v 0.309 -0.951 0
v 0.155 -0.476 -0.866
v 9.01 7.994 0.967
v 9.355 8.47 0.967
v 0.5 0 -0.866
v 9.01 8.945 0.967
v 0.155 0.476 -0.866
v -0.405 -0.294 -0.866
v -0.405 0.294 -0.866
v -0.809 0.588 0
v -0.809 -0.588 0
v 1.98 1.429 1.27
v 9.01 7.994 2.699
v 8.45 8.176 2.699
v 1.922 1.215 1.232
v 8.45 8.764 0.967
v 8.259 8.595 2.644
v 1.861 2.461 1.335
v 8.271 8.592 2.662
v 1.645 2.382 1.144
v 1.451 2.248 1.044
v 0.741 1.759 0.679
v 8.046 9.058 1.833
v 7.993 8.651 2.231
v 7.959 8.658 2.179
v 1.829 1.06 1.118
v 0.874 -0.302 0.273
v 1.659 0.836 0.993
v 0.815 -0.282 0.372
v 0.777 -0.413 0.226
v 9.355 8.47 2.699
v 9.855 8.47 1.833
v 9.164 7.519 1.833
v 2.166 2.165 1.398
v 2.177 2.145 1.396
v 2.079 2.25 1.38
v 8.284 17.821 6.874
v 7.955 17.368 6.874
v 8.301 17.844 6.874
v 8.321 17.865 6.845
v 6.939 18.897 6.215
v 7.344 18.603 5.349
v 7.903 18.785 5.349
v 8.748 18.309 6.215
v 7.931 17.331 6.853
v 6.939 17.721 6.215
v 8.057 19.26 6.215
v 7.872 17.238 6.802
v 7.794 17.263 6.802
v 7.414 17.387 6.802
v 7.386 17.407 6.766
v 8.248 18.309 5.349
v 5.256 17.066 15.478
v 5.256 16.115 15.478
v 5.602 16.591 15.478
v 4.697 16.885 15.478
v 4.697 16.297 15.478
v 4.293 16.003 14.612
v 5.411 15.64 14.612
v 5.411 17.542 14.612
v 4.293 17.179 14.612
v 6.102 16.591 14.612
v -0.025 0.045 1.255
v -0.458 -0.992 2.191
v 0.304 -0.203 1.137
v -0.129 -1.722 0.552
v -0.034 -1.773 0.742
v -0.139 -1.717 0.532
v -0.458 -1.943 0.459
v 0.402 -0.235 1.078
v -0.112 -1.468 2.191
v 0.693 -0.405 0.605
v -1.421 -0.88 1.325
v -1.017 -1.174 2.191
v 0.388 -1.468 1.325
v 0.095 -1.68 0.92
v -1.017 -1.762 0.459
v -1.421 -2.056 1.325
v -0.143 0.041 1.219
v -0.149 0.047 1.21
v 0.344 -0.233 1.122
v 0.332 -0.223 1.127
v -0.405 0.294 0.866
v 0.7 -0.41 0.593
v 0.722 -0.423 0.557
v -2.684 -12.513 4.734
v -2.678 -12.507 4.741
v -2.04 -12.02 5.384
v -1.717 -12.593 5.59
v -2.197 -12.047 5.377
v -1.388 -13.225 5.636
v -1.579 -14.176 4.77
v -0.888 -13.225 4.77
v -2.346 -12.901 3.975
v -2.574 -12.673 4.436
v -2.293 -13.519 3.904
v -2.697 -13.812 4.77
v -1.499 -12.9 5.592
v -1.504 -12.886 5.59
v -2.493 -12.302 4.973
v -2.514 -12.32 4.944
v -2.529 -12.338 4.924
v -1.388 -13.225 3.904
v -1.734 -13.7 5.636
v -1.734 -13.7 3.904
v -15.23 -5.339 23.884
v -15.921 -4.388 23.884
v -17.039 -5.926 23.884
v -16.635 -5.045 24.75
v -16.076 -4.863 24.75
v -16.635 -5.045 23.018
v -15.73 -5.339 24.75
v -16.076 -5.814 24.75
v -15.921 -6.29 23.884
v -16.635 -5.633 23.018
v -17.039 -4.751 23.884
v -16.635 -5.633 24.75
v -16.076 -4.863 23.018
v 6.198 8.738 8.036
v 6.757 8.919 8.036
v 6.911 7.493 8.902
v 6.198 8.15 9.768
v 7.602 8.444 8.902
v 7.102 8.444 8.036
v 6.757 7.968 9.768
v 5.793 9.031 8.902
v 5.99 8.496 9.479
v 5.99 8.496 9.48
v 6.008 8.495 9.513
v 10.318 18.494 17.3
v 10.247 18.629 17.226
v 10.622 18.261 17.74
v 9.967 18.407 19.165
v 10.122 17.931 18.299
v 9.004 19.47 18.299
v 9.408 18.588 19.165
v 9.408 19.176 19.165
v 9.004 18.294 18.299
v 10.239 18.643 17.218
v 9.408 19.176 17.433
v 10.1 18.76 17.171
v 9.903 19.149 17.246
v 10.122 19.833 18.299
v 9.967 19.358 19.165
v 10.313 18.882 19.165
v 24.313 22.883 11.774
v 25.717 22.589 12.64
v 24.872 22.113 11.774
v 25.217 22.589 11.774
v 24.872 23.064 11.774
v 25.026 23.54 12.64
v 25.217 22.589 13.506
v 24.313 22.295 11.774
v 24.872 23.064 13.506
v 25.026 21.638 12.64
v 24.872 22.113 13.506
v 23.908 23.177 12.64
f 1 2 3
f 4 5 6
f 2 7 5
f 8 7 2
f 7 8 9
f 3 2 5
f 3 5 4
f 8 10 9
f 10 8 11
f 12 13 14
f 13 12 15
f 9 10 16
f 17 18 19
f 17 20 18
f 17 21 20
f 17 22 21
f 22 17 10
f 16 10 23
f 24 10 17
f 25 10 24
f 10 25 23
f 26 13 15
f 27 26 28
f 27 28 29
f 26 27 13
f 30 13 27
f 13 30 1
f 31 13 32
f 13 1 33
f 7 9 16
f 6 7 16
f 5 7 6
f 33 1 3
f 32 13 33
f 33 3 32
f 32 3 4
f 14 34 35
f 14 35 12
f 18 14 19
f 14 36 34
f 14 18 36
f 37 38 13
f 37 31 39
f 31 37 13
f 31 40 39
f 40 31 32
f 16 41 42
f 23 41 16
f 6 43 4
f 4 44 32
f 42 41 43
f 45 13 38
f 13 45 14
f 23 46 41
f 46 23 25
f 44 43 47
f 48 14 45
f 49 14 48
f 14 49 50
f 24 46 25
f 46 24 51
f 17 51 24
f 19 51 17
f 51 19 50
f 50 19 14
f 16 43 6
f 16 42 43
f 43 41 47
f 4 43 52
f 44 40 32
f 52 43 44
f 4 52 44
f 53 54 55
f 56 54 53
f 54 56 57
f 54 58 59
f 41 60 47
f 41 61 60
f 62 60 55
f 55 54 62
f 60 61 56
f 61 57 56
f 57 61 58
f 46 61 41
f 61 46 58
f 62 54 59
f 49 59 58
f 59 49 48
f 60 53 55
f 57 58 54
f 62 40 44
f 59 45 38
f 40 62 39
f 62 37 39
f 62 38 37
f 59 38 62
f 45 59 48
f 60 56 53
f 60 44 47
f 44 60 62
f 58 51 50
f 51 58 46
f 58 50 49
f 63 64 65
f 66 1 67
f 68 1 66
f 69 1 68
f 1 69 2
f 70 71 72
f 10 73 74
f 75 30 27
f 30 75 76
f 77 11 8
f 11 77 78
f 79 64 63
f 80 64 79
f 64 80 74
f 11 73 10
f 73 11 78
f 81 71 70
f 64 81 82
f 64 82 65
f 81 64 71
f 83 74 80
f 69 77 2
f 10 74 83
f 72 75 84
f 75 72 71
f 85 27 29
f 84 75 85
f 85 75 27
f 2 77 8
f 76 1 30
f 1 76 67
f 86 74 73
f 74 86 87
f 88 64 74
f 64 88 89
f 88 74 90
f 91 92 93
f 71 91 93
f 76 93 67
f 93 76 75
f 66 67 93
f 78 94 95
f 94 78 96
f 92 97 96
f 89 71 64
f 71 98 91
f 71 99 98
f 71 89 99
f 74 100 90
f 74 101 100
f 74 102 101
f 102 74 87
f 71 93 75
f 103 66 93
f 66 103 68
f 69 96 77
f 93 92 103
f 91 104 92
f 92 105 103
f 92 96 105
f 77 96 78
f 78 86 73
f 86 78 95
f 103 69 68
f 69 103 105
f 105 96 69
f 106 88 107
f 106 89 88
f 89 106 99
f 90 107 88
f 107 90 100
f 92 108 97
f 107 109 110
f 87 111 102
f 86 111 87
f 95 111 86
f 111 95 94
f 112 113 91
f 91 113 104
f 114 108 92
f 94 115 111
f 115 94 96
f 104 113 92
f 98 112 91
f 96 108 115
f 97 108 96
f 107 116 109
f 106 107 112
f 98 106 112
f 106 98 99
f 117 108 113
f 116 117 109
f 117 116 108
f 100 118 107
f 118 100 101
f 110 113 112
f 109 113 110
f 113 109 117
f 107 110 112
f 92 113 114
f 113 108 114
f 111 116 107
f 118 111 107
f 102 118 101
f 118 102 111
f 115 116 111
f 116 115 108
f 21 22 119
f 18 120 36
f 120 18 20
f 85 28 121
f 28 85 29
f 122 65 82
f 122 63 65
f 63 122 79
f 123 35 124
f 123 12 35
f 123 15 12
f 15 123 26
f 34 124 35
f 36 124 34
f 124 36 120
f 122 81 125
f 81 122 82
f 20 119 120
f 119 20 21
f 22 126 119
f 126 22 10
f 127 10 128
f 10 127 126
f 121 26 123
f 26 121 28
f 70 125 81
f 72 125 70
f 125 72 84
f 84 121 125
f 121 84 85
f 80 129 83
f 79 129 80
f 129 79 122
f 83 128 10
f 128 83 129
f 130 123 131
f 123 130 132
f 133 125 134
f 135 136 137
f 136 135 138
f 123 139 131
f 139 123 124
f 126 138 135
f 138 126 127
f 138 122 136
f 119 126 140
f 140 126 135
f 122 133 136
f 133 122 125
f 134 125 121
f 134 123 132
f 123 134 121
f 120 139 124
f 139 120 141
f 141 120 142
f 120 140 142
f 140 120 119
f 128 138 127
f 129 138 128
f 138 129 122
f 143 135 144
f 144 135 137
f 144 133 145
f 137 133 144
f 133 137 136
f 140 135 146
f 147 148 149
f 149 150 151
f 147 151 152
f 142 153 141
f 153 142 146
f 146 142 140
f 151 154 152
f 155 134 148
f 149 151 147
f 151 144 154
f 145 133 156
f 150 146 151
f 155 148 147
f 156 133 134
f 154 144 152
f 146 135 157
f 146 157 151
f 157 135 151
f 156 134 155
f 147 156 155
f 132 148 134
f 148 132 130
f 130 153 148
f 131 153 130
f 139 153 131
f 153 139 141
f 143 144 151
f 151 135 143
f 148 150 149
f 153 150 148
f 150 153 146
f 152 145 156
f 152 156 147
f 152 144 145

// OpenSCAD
root=[0,0,0];
 
node1=[for(i=[0:3])[rnd(i,i*-10),rnd(i,i*-10),rnd(i,i*10)]];
node2=[for(i=[0:3])[rnd(i,i*10),rnd(i,i*10),rnd(i,i*10)]];
    node3=[for(i=[0:3]) [rnd(i,i*10),rnd(i,i*10),rnd(i,i*10)]];
graph=[root,  node3 ,node1, node2,];

plotgraph(graph);

 module plotgraph(g)
{ 
    root=g[0];
for (i=[1:len(g)-1])
    {
        if(is_node(g[i])){ line(g[i-1],g[i],1);}
        else plotgraph( g[i] );
        }
    
    }
    
    
    
function is_node(v)= is_list(v) && len(v)==3 &&(is_num(v[0])&&is_num(v[1])&&is_num(v[2])) ;






function v3(p) = [p.x,p.y,p.z]; // vec3 formatter
function rev(v) = [for (i = [len(v) - 1: -1: 0]) v[i]];
function avrg(l) = len(l) > 1 ? addl(l) / (len(l)) : l;
function avrgp(l) = len(l) > 1 ? addlp(l) / (len(l)) : l;
function addlp(v,i=0,r=[0,0,0]) = i<len(v) ? addlp(v,i+1,r+v[i]) : r;
function lerp(start,end,bias) = (end * bias + start * (1 - bias));
function un(v)=assert (is_list(v)) v/max(norm(v),1e-64) ;
function rndc(a = 1,b = 0,s = [])=[rnd(a,b,s),rnd(a,b,s),rnd(a,b,s)];
function rnd(a = 1,b = 0,s = []) =
s == []?(rands(min(a,b),max(a,b),1)[0]) :(rands(min(a,b),max(a,b),1,s)[0]);


module polyline(p) {for(i=[0:max(0,len(p)-2)])line(p[i],p[wrap(i+1,len(p) )]);}

module polyline_open(p) {
     if (len(p)-1>1)
     for(i=[0:max(0,len(p)-2)])line(p[i],p[   i+1]);
} // polyline plotter

module line(p1,p2 ,width=2) 
{ // single line plotter
hull() {
translate(p1) sphere(width);
translate(p2) sphere(width);
}
}









function un(v)=v/max(norm(v),1e-16);// div by zero safe unit normal
function rnd(a = 1, b = 0, s = []) = 
  s == [] ? 
   (rands(min(a, b), max(   a, b), 1)[0]) 
  : 
   (rands(min(a, b), max(a, b), 1, s)[0])
  ; // nice rands wrapper
